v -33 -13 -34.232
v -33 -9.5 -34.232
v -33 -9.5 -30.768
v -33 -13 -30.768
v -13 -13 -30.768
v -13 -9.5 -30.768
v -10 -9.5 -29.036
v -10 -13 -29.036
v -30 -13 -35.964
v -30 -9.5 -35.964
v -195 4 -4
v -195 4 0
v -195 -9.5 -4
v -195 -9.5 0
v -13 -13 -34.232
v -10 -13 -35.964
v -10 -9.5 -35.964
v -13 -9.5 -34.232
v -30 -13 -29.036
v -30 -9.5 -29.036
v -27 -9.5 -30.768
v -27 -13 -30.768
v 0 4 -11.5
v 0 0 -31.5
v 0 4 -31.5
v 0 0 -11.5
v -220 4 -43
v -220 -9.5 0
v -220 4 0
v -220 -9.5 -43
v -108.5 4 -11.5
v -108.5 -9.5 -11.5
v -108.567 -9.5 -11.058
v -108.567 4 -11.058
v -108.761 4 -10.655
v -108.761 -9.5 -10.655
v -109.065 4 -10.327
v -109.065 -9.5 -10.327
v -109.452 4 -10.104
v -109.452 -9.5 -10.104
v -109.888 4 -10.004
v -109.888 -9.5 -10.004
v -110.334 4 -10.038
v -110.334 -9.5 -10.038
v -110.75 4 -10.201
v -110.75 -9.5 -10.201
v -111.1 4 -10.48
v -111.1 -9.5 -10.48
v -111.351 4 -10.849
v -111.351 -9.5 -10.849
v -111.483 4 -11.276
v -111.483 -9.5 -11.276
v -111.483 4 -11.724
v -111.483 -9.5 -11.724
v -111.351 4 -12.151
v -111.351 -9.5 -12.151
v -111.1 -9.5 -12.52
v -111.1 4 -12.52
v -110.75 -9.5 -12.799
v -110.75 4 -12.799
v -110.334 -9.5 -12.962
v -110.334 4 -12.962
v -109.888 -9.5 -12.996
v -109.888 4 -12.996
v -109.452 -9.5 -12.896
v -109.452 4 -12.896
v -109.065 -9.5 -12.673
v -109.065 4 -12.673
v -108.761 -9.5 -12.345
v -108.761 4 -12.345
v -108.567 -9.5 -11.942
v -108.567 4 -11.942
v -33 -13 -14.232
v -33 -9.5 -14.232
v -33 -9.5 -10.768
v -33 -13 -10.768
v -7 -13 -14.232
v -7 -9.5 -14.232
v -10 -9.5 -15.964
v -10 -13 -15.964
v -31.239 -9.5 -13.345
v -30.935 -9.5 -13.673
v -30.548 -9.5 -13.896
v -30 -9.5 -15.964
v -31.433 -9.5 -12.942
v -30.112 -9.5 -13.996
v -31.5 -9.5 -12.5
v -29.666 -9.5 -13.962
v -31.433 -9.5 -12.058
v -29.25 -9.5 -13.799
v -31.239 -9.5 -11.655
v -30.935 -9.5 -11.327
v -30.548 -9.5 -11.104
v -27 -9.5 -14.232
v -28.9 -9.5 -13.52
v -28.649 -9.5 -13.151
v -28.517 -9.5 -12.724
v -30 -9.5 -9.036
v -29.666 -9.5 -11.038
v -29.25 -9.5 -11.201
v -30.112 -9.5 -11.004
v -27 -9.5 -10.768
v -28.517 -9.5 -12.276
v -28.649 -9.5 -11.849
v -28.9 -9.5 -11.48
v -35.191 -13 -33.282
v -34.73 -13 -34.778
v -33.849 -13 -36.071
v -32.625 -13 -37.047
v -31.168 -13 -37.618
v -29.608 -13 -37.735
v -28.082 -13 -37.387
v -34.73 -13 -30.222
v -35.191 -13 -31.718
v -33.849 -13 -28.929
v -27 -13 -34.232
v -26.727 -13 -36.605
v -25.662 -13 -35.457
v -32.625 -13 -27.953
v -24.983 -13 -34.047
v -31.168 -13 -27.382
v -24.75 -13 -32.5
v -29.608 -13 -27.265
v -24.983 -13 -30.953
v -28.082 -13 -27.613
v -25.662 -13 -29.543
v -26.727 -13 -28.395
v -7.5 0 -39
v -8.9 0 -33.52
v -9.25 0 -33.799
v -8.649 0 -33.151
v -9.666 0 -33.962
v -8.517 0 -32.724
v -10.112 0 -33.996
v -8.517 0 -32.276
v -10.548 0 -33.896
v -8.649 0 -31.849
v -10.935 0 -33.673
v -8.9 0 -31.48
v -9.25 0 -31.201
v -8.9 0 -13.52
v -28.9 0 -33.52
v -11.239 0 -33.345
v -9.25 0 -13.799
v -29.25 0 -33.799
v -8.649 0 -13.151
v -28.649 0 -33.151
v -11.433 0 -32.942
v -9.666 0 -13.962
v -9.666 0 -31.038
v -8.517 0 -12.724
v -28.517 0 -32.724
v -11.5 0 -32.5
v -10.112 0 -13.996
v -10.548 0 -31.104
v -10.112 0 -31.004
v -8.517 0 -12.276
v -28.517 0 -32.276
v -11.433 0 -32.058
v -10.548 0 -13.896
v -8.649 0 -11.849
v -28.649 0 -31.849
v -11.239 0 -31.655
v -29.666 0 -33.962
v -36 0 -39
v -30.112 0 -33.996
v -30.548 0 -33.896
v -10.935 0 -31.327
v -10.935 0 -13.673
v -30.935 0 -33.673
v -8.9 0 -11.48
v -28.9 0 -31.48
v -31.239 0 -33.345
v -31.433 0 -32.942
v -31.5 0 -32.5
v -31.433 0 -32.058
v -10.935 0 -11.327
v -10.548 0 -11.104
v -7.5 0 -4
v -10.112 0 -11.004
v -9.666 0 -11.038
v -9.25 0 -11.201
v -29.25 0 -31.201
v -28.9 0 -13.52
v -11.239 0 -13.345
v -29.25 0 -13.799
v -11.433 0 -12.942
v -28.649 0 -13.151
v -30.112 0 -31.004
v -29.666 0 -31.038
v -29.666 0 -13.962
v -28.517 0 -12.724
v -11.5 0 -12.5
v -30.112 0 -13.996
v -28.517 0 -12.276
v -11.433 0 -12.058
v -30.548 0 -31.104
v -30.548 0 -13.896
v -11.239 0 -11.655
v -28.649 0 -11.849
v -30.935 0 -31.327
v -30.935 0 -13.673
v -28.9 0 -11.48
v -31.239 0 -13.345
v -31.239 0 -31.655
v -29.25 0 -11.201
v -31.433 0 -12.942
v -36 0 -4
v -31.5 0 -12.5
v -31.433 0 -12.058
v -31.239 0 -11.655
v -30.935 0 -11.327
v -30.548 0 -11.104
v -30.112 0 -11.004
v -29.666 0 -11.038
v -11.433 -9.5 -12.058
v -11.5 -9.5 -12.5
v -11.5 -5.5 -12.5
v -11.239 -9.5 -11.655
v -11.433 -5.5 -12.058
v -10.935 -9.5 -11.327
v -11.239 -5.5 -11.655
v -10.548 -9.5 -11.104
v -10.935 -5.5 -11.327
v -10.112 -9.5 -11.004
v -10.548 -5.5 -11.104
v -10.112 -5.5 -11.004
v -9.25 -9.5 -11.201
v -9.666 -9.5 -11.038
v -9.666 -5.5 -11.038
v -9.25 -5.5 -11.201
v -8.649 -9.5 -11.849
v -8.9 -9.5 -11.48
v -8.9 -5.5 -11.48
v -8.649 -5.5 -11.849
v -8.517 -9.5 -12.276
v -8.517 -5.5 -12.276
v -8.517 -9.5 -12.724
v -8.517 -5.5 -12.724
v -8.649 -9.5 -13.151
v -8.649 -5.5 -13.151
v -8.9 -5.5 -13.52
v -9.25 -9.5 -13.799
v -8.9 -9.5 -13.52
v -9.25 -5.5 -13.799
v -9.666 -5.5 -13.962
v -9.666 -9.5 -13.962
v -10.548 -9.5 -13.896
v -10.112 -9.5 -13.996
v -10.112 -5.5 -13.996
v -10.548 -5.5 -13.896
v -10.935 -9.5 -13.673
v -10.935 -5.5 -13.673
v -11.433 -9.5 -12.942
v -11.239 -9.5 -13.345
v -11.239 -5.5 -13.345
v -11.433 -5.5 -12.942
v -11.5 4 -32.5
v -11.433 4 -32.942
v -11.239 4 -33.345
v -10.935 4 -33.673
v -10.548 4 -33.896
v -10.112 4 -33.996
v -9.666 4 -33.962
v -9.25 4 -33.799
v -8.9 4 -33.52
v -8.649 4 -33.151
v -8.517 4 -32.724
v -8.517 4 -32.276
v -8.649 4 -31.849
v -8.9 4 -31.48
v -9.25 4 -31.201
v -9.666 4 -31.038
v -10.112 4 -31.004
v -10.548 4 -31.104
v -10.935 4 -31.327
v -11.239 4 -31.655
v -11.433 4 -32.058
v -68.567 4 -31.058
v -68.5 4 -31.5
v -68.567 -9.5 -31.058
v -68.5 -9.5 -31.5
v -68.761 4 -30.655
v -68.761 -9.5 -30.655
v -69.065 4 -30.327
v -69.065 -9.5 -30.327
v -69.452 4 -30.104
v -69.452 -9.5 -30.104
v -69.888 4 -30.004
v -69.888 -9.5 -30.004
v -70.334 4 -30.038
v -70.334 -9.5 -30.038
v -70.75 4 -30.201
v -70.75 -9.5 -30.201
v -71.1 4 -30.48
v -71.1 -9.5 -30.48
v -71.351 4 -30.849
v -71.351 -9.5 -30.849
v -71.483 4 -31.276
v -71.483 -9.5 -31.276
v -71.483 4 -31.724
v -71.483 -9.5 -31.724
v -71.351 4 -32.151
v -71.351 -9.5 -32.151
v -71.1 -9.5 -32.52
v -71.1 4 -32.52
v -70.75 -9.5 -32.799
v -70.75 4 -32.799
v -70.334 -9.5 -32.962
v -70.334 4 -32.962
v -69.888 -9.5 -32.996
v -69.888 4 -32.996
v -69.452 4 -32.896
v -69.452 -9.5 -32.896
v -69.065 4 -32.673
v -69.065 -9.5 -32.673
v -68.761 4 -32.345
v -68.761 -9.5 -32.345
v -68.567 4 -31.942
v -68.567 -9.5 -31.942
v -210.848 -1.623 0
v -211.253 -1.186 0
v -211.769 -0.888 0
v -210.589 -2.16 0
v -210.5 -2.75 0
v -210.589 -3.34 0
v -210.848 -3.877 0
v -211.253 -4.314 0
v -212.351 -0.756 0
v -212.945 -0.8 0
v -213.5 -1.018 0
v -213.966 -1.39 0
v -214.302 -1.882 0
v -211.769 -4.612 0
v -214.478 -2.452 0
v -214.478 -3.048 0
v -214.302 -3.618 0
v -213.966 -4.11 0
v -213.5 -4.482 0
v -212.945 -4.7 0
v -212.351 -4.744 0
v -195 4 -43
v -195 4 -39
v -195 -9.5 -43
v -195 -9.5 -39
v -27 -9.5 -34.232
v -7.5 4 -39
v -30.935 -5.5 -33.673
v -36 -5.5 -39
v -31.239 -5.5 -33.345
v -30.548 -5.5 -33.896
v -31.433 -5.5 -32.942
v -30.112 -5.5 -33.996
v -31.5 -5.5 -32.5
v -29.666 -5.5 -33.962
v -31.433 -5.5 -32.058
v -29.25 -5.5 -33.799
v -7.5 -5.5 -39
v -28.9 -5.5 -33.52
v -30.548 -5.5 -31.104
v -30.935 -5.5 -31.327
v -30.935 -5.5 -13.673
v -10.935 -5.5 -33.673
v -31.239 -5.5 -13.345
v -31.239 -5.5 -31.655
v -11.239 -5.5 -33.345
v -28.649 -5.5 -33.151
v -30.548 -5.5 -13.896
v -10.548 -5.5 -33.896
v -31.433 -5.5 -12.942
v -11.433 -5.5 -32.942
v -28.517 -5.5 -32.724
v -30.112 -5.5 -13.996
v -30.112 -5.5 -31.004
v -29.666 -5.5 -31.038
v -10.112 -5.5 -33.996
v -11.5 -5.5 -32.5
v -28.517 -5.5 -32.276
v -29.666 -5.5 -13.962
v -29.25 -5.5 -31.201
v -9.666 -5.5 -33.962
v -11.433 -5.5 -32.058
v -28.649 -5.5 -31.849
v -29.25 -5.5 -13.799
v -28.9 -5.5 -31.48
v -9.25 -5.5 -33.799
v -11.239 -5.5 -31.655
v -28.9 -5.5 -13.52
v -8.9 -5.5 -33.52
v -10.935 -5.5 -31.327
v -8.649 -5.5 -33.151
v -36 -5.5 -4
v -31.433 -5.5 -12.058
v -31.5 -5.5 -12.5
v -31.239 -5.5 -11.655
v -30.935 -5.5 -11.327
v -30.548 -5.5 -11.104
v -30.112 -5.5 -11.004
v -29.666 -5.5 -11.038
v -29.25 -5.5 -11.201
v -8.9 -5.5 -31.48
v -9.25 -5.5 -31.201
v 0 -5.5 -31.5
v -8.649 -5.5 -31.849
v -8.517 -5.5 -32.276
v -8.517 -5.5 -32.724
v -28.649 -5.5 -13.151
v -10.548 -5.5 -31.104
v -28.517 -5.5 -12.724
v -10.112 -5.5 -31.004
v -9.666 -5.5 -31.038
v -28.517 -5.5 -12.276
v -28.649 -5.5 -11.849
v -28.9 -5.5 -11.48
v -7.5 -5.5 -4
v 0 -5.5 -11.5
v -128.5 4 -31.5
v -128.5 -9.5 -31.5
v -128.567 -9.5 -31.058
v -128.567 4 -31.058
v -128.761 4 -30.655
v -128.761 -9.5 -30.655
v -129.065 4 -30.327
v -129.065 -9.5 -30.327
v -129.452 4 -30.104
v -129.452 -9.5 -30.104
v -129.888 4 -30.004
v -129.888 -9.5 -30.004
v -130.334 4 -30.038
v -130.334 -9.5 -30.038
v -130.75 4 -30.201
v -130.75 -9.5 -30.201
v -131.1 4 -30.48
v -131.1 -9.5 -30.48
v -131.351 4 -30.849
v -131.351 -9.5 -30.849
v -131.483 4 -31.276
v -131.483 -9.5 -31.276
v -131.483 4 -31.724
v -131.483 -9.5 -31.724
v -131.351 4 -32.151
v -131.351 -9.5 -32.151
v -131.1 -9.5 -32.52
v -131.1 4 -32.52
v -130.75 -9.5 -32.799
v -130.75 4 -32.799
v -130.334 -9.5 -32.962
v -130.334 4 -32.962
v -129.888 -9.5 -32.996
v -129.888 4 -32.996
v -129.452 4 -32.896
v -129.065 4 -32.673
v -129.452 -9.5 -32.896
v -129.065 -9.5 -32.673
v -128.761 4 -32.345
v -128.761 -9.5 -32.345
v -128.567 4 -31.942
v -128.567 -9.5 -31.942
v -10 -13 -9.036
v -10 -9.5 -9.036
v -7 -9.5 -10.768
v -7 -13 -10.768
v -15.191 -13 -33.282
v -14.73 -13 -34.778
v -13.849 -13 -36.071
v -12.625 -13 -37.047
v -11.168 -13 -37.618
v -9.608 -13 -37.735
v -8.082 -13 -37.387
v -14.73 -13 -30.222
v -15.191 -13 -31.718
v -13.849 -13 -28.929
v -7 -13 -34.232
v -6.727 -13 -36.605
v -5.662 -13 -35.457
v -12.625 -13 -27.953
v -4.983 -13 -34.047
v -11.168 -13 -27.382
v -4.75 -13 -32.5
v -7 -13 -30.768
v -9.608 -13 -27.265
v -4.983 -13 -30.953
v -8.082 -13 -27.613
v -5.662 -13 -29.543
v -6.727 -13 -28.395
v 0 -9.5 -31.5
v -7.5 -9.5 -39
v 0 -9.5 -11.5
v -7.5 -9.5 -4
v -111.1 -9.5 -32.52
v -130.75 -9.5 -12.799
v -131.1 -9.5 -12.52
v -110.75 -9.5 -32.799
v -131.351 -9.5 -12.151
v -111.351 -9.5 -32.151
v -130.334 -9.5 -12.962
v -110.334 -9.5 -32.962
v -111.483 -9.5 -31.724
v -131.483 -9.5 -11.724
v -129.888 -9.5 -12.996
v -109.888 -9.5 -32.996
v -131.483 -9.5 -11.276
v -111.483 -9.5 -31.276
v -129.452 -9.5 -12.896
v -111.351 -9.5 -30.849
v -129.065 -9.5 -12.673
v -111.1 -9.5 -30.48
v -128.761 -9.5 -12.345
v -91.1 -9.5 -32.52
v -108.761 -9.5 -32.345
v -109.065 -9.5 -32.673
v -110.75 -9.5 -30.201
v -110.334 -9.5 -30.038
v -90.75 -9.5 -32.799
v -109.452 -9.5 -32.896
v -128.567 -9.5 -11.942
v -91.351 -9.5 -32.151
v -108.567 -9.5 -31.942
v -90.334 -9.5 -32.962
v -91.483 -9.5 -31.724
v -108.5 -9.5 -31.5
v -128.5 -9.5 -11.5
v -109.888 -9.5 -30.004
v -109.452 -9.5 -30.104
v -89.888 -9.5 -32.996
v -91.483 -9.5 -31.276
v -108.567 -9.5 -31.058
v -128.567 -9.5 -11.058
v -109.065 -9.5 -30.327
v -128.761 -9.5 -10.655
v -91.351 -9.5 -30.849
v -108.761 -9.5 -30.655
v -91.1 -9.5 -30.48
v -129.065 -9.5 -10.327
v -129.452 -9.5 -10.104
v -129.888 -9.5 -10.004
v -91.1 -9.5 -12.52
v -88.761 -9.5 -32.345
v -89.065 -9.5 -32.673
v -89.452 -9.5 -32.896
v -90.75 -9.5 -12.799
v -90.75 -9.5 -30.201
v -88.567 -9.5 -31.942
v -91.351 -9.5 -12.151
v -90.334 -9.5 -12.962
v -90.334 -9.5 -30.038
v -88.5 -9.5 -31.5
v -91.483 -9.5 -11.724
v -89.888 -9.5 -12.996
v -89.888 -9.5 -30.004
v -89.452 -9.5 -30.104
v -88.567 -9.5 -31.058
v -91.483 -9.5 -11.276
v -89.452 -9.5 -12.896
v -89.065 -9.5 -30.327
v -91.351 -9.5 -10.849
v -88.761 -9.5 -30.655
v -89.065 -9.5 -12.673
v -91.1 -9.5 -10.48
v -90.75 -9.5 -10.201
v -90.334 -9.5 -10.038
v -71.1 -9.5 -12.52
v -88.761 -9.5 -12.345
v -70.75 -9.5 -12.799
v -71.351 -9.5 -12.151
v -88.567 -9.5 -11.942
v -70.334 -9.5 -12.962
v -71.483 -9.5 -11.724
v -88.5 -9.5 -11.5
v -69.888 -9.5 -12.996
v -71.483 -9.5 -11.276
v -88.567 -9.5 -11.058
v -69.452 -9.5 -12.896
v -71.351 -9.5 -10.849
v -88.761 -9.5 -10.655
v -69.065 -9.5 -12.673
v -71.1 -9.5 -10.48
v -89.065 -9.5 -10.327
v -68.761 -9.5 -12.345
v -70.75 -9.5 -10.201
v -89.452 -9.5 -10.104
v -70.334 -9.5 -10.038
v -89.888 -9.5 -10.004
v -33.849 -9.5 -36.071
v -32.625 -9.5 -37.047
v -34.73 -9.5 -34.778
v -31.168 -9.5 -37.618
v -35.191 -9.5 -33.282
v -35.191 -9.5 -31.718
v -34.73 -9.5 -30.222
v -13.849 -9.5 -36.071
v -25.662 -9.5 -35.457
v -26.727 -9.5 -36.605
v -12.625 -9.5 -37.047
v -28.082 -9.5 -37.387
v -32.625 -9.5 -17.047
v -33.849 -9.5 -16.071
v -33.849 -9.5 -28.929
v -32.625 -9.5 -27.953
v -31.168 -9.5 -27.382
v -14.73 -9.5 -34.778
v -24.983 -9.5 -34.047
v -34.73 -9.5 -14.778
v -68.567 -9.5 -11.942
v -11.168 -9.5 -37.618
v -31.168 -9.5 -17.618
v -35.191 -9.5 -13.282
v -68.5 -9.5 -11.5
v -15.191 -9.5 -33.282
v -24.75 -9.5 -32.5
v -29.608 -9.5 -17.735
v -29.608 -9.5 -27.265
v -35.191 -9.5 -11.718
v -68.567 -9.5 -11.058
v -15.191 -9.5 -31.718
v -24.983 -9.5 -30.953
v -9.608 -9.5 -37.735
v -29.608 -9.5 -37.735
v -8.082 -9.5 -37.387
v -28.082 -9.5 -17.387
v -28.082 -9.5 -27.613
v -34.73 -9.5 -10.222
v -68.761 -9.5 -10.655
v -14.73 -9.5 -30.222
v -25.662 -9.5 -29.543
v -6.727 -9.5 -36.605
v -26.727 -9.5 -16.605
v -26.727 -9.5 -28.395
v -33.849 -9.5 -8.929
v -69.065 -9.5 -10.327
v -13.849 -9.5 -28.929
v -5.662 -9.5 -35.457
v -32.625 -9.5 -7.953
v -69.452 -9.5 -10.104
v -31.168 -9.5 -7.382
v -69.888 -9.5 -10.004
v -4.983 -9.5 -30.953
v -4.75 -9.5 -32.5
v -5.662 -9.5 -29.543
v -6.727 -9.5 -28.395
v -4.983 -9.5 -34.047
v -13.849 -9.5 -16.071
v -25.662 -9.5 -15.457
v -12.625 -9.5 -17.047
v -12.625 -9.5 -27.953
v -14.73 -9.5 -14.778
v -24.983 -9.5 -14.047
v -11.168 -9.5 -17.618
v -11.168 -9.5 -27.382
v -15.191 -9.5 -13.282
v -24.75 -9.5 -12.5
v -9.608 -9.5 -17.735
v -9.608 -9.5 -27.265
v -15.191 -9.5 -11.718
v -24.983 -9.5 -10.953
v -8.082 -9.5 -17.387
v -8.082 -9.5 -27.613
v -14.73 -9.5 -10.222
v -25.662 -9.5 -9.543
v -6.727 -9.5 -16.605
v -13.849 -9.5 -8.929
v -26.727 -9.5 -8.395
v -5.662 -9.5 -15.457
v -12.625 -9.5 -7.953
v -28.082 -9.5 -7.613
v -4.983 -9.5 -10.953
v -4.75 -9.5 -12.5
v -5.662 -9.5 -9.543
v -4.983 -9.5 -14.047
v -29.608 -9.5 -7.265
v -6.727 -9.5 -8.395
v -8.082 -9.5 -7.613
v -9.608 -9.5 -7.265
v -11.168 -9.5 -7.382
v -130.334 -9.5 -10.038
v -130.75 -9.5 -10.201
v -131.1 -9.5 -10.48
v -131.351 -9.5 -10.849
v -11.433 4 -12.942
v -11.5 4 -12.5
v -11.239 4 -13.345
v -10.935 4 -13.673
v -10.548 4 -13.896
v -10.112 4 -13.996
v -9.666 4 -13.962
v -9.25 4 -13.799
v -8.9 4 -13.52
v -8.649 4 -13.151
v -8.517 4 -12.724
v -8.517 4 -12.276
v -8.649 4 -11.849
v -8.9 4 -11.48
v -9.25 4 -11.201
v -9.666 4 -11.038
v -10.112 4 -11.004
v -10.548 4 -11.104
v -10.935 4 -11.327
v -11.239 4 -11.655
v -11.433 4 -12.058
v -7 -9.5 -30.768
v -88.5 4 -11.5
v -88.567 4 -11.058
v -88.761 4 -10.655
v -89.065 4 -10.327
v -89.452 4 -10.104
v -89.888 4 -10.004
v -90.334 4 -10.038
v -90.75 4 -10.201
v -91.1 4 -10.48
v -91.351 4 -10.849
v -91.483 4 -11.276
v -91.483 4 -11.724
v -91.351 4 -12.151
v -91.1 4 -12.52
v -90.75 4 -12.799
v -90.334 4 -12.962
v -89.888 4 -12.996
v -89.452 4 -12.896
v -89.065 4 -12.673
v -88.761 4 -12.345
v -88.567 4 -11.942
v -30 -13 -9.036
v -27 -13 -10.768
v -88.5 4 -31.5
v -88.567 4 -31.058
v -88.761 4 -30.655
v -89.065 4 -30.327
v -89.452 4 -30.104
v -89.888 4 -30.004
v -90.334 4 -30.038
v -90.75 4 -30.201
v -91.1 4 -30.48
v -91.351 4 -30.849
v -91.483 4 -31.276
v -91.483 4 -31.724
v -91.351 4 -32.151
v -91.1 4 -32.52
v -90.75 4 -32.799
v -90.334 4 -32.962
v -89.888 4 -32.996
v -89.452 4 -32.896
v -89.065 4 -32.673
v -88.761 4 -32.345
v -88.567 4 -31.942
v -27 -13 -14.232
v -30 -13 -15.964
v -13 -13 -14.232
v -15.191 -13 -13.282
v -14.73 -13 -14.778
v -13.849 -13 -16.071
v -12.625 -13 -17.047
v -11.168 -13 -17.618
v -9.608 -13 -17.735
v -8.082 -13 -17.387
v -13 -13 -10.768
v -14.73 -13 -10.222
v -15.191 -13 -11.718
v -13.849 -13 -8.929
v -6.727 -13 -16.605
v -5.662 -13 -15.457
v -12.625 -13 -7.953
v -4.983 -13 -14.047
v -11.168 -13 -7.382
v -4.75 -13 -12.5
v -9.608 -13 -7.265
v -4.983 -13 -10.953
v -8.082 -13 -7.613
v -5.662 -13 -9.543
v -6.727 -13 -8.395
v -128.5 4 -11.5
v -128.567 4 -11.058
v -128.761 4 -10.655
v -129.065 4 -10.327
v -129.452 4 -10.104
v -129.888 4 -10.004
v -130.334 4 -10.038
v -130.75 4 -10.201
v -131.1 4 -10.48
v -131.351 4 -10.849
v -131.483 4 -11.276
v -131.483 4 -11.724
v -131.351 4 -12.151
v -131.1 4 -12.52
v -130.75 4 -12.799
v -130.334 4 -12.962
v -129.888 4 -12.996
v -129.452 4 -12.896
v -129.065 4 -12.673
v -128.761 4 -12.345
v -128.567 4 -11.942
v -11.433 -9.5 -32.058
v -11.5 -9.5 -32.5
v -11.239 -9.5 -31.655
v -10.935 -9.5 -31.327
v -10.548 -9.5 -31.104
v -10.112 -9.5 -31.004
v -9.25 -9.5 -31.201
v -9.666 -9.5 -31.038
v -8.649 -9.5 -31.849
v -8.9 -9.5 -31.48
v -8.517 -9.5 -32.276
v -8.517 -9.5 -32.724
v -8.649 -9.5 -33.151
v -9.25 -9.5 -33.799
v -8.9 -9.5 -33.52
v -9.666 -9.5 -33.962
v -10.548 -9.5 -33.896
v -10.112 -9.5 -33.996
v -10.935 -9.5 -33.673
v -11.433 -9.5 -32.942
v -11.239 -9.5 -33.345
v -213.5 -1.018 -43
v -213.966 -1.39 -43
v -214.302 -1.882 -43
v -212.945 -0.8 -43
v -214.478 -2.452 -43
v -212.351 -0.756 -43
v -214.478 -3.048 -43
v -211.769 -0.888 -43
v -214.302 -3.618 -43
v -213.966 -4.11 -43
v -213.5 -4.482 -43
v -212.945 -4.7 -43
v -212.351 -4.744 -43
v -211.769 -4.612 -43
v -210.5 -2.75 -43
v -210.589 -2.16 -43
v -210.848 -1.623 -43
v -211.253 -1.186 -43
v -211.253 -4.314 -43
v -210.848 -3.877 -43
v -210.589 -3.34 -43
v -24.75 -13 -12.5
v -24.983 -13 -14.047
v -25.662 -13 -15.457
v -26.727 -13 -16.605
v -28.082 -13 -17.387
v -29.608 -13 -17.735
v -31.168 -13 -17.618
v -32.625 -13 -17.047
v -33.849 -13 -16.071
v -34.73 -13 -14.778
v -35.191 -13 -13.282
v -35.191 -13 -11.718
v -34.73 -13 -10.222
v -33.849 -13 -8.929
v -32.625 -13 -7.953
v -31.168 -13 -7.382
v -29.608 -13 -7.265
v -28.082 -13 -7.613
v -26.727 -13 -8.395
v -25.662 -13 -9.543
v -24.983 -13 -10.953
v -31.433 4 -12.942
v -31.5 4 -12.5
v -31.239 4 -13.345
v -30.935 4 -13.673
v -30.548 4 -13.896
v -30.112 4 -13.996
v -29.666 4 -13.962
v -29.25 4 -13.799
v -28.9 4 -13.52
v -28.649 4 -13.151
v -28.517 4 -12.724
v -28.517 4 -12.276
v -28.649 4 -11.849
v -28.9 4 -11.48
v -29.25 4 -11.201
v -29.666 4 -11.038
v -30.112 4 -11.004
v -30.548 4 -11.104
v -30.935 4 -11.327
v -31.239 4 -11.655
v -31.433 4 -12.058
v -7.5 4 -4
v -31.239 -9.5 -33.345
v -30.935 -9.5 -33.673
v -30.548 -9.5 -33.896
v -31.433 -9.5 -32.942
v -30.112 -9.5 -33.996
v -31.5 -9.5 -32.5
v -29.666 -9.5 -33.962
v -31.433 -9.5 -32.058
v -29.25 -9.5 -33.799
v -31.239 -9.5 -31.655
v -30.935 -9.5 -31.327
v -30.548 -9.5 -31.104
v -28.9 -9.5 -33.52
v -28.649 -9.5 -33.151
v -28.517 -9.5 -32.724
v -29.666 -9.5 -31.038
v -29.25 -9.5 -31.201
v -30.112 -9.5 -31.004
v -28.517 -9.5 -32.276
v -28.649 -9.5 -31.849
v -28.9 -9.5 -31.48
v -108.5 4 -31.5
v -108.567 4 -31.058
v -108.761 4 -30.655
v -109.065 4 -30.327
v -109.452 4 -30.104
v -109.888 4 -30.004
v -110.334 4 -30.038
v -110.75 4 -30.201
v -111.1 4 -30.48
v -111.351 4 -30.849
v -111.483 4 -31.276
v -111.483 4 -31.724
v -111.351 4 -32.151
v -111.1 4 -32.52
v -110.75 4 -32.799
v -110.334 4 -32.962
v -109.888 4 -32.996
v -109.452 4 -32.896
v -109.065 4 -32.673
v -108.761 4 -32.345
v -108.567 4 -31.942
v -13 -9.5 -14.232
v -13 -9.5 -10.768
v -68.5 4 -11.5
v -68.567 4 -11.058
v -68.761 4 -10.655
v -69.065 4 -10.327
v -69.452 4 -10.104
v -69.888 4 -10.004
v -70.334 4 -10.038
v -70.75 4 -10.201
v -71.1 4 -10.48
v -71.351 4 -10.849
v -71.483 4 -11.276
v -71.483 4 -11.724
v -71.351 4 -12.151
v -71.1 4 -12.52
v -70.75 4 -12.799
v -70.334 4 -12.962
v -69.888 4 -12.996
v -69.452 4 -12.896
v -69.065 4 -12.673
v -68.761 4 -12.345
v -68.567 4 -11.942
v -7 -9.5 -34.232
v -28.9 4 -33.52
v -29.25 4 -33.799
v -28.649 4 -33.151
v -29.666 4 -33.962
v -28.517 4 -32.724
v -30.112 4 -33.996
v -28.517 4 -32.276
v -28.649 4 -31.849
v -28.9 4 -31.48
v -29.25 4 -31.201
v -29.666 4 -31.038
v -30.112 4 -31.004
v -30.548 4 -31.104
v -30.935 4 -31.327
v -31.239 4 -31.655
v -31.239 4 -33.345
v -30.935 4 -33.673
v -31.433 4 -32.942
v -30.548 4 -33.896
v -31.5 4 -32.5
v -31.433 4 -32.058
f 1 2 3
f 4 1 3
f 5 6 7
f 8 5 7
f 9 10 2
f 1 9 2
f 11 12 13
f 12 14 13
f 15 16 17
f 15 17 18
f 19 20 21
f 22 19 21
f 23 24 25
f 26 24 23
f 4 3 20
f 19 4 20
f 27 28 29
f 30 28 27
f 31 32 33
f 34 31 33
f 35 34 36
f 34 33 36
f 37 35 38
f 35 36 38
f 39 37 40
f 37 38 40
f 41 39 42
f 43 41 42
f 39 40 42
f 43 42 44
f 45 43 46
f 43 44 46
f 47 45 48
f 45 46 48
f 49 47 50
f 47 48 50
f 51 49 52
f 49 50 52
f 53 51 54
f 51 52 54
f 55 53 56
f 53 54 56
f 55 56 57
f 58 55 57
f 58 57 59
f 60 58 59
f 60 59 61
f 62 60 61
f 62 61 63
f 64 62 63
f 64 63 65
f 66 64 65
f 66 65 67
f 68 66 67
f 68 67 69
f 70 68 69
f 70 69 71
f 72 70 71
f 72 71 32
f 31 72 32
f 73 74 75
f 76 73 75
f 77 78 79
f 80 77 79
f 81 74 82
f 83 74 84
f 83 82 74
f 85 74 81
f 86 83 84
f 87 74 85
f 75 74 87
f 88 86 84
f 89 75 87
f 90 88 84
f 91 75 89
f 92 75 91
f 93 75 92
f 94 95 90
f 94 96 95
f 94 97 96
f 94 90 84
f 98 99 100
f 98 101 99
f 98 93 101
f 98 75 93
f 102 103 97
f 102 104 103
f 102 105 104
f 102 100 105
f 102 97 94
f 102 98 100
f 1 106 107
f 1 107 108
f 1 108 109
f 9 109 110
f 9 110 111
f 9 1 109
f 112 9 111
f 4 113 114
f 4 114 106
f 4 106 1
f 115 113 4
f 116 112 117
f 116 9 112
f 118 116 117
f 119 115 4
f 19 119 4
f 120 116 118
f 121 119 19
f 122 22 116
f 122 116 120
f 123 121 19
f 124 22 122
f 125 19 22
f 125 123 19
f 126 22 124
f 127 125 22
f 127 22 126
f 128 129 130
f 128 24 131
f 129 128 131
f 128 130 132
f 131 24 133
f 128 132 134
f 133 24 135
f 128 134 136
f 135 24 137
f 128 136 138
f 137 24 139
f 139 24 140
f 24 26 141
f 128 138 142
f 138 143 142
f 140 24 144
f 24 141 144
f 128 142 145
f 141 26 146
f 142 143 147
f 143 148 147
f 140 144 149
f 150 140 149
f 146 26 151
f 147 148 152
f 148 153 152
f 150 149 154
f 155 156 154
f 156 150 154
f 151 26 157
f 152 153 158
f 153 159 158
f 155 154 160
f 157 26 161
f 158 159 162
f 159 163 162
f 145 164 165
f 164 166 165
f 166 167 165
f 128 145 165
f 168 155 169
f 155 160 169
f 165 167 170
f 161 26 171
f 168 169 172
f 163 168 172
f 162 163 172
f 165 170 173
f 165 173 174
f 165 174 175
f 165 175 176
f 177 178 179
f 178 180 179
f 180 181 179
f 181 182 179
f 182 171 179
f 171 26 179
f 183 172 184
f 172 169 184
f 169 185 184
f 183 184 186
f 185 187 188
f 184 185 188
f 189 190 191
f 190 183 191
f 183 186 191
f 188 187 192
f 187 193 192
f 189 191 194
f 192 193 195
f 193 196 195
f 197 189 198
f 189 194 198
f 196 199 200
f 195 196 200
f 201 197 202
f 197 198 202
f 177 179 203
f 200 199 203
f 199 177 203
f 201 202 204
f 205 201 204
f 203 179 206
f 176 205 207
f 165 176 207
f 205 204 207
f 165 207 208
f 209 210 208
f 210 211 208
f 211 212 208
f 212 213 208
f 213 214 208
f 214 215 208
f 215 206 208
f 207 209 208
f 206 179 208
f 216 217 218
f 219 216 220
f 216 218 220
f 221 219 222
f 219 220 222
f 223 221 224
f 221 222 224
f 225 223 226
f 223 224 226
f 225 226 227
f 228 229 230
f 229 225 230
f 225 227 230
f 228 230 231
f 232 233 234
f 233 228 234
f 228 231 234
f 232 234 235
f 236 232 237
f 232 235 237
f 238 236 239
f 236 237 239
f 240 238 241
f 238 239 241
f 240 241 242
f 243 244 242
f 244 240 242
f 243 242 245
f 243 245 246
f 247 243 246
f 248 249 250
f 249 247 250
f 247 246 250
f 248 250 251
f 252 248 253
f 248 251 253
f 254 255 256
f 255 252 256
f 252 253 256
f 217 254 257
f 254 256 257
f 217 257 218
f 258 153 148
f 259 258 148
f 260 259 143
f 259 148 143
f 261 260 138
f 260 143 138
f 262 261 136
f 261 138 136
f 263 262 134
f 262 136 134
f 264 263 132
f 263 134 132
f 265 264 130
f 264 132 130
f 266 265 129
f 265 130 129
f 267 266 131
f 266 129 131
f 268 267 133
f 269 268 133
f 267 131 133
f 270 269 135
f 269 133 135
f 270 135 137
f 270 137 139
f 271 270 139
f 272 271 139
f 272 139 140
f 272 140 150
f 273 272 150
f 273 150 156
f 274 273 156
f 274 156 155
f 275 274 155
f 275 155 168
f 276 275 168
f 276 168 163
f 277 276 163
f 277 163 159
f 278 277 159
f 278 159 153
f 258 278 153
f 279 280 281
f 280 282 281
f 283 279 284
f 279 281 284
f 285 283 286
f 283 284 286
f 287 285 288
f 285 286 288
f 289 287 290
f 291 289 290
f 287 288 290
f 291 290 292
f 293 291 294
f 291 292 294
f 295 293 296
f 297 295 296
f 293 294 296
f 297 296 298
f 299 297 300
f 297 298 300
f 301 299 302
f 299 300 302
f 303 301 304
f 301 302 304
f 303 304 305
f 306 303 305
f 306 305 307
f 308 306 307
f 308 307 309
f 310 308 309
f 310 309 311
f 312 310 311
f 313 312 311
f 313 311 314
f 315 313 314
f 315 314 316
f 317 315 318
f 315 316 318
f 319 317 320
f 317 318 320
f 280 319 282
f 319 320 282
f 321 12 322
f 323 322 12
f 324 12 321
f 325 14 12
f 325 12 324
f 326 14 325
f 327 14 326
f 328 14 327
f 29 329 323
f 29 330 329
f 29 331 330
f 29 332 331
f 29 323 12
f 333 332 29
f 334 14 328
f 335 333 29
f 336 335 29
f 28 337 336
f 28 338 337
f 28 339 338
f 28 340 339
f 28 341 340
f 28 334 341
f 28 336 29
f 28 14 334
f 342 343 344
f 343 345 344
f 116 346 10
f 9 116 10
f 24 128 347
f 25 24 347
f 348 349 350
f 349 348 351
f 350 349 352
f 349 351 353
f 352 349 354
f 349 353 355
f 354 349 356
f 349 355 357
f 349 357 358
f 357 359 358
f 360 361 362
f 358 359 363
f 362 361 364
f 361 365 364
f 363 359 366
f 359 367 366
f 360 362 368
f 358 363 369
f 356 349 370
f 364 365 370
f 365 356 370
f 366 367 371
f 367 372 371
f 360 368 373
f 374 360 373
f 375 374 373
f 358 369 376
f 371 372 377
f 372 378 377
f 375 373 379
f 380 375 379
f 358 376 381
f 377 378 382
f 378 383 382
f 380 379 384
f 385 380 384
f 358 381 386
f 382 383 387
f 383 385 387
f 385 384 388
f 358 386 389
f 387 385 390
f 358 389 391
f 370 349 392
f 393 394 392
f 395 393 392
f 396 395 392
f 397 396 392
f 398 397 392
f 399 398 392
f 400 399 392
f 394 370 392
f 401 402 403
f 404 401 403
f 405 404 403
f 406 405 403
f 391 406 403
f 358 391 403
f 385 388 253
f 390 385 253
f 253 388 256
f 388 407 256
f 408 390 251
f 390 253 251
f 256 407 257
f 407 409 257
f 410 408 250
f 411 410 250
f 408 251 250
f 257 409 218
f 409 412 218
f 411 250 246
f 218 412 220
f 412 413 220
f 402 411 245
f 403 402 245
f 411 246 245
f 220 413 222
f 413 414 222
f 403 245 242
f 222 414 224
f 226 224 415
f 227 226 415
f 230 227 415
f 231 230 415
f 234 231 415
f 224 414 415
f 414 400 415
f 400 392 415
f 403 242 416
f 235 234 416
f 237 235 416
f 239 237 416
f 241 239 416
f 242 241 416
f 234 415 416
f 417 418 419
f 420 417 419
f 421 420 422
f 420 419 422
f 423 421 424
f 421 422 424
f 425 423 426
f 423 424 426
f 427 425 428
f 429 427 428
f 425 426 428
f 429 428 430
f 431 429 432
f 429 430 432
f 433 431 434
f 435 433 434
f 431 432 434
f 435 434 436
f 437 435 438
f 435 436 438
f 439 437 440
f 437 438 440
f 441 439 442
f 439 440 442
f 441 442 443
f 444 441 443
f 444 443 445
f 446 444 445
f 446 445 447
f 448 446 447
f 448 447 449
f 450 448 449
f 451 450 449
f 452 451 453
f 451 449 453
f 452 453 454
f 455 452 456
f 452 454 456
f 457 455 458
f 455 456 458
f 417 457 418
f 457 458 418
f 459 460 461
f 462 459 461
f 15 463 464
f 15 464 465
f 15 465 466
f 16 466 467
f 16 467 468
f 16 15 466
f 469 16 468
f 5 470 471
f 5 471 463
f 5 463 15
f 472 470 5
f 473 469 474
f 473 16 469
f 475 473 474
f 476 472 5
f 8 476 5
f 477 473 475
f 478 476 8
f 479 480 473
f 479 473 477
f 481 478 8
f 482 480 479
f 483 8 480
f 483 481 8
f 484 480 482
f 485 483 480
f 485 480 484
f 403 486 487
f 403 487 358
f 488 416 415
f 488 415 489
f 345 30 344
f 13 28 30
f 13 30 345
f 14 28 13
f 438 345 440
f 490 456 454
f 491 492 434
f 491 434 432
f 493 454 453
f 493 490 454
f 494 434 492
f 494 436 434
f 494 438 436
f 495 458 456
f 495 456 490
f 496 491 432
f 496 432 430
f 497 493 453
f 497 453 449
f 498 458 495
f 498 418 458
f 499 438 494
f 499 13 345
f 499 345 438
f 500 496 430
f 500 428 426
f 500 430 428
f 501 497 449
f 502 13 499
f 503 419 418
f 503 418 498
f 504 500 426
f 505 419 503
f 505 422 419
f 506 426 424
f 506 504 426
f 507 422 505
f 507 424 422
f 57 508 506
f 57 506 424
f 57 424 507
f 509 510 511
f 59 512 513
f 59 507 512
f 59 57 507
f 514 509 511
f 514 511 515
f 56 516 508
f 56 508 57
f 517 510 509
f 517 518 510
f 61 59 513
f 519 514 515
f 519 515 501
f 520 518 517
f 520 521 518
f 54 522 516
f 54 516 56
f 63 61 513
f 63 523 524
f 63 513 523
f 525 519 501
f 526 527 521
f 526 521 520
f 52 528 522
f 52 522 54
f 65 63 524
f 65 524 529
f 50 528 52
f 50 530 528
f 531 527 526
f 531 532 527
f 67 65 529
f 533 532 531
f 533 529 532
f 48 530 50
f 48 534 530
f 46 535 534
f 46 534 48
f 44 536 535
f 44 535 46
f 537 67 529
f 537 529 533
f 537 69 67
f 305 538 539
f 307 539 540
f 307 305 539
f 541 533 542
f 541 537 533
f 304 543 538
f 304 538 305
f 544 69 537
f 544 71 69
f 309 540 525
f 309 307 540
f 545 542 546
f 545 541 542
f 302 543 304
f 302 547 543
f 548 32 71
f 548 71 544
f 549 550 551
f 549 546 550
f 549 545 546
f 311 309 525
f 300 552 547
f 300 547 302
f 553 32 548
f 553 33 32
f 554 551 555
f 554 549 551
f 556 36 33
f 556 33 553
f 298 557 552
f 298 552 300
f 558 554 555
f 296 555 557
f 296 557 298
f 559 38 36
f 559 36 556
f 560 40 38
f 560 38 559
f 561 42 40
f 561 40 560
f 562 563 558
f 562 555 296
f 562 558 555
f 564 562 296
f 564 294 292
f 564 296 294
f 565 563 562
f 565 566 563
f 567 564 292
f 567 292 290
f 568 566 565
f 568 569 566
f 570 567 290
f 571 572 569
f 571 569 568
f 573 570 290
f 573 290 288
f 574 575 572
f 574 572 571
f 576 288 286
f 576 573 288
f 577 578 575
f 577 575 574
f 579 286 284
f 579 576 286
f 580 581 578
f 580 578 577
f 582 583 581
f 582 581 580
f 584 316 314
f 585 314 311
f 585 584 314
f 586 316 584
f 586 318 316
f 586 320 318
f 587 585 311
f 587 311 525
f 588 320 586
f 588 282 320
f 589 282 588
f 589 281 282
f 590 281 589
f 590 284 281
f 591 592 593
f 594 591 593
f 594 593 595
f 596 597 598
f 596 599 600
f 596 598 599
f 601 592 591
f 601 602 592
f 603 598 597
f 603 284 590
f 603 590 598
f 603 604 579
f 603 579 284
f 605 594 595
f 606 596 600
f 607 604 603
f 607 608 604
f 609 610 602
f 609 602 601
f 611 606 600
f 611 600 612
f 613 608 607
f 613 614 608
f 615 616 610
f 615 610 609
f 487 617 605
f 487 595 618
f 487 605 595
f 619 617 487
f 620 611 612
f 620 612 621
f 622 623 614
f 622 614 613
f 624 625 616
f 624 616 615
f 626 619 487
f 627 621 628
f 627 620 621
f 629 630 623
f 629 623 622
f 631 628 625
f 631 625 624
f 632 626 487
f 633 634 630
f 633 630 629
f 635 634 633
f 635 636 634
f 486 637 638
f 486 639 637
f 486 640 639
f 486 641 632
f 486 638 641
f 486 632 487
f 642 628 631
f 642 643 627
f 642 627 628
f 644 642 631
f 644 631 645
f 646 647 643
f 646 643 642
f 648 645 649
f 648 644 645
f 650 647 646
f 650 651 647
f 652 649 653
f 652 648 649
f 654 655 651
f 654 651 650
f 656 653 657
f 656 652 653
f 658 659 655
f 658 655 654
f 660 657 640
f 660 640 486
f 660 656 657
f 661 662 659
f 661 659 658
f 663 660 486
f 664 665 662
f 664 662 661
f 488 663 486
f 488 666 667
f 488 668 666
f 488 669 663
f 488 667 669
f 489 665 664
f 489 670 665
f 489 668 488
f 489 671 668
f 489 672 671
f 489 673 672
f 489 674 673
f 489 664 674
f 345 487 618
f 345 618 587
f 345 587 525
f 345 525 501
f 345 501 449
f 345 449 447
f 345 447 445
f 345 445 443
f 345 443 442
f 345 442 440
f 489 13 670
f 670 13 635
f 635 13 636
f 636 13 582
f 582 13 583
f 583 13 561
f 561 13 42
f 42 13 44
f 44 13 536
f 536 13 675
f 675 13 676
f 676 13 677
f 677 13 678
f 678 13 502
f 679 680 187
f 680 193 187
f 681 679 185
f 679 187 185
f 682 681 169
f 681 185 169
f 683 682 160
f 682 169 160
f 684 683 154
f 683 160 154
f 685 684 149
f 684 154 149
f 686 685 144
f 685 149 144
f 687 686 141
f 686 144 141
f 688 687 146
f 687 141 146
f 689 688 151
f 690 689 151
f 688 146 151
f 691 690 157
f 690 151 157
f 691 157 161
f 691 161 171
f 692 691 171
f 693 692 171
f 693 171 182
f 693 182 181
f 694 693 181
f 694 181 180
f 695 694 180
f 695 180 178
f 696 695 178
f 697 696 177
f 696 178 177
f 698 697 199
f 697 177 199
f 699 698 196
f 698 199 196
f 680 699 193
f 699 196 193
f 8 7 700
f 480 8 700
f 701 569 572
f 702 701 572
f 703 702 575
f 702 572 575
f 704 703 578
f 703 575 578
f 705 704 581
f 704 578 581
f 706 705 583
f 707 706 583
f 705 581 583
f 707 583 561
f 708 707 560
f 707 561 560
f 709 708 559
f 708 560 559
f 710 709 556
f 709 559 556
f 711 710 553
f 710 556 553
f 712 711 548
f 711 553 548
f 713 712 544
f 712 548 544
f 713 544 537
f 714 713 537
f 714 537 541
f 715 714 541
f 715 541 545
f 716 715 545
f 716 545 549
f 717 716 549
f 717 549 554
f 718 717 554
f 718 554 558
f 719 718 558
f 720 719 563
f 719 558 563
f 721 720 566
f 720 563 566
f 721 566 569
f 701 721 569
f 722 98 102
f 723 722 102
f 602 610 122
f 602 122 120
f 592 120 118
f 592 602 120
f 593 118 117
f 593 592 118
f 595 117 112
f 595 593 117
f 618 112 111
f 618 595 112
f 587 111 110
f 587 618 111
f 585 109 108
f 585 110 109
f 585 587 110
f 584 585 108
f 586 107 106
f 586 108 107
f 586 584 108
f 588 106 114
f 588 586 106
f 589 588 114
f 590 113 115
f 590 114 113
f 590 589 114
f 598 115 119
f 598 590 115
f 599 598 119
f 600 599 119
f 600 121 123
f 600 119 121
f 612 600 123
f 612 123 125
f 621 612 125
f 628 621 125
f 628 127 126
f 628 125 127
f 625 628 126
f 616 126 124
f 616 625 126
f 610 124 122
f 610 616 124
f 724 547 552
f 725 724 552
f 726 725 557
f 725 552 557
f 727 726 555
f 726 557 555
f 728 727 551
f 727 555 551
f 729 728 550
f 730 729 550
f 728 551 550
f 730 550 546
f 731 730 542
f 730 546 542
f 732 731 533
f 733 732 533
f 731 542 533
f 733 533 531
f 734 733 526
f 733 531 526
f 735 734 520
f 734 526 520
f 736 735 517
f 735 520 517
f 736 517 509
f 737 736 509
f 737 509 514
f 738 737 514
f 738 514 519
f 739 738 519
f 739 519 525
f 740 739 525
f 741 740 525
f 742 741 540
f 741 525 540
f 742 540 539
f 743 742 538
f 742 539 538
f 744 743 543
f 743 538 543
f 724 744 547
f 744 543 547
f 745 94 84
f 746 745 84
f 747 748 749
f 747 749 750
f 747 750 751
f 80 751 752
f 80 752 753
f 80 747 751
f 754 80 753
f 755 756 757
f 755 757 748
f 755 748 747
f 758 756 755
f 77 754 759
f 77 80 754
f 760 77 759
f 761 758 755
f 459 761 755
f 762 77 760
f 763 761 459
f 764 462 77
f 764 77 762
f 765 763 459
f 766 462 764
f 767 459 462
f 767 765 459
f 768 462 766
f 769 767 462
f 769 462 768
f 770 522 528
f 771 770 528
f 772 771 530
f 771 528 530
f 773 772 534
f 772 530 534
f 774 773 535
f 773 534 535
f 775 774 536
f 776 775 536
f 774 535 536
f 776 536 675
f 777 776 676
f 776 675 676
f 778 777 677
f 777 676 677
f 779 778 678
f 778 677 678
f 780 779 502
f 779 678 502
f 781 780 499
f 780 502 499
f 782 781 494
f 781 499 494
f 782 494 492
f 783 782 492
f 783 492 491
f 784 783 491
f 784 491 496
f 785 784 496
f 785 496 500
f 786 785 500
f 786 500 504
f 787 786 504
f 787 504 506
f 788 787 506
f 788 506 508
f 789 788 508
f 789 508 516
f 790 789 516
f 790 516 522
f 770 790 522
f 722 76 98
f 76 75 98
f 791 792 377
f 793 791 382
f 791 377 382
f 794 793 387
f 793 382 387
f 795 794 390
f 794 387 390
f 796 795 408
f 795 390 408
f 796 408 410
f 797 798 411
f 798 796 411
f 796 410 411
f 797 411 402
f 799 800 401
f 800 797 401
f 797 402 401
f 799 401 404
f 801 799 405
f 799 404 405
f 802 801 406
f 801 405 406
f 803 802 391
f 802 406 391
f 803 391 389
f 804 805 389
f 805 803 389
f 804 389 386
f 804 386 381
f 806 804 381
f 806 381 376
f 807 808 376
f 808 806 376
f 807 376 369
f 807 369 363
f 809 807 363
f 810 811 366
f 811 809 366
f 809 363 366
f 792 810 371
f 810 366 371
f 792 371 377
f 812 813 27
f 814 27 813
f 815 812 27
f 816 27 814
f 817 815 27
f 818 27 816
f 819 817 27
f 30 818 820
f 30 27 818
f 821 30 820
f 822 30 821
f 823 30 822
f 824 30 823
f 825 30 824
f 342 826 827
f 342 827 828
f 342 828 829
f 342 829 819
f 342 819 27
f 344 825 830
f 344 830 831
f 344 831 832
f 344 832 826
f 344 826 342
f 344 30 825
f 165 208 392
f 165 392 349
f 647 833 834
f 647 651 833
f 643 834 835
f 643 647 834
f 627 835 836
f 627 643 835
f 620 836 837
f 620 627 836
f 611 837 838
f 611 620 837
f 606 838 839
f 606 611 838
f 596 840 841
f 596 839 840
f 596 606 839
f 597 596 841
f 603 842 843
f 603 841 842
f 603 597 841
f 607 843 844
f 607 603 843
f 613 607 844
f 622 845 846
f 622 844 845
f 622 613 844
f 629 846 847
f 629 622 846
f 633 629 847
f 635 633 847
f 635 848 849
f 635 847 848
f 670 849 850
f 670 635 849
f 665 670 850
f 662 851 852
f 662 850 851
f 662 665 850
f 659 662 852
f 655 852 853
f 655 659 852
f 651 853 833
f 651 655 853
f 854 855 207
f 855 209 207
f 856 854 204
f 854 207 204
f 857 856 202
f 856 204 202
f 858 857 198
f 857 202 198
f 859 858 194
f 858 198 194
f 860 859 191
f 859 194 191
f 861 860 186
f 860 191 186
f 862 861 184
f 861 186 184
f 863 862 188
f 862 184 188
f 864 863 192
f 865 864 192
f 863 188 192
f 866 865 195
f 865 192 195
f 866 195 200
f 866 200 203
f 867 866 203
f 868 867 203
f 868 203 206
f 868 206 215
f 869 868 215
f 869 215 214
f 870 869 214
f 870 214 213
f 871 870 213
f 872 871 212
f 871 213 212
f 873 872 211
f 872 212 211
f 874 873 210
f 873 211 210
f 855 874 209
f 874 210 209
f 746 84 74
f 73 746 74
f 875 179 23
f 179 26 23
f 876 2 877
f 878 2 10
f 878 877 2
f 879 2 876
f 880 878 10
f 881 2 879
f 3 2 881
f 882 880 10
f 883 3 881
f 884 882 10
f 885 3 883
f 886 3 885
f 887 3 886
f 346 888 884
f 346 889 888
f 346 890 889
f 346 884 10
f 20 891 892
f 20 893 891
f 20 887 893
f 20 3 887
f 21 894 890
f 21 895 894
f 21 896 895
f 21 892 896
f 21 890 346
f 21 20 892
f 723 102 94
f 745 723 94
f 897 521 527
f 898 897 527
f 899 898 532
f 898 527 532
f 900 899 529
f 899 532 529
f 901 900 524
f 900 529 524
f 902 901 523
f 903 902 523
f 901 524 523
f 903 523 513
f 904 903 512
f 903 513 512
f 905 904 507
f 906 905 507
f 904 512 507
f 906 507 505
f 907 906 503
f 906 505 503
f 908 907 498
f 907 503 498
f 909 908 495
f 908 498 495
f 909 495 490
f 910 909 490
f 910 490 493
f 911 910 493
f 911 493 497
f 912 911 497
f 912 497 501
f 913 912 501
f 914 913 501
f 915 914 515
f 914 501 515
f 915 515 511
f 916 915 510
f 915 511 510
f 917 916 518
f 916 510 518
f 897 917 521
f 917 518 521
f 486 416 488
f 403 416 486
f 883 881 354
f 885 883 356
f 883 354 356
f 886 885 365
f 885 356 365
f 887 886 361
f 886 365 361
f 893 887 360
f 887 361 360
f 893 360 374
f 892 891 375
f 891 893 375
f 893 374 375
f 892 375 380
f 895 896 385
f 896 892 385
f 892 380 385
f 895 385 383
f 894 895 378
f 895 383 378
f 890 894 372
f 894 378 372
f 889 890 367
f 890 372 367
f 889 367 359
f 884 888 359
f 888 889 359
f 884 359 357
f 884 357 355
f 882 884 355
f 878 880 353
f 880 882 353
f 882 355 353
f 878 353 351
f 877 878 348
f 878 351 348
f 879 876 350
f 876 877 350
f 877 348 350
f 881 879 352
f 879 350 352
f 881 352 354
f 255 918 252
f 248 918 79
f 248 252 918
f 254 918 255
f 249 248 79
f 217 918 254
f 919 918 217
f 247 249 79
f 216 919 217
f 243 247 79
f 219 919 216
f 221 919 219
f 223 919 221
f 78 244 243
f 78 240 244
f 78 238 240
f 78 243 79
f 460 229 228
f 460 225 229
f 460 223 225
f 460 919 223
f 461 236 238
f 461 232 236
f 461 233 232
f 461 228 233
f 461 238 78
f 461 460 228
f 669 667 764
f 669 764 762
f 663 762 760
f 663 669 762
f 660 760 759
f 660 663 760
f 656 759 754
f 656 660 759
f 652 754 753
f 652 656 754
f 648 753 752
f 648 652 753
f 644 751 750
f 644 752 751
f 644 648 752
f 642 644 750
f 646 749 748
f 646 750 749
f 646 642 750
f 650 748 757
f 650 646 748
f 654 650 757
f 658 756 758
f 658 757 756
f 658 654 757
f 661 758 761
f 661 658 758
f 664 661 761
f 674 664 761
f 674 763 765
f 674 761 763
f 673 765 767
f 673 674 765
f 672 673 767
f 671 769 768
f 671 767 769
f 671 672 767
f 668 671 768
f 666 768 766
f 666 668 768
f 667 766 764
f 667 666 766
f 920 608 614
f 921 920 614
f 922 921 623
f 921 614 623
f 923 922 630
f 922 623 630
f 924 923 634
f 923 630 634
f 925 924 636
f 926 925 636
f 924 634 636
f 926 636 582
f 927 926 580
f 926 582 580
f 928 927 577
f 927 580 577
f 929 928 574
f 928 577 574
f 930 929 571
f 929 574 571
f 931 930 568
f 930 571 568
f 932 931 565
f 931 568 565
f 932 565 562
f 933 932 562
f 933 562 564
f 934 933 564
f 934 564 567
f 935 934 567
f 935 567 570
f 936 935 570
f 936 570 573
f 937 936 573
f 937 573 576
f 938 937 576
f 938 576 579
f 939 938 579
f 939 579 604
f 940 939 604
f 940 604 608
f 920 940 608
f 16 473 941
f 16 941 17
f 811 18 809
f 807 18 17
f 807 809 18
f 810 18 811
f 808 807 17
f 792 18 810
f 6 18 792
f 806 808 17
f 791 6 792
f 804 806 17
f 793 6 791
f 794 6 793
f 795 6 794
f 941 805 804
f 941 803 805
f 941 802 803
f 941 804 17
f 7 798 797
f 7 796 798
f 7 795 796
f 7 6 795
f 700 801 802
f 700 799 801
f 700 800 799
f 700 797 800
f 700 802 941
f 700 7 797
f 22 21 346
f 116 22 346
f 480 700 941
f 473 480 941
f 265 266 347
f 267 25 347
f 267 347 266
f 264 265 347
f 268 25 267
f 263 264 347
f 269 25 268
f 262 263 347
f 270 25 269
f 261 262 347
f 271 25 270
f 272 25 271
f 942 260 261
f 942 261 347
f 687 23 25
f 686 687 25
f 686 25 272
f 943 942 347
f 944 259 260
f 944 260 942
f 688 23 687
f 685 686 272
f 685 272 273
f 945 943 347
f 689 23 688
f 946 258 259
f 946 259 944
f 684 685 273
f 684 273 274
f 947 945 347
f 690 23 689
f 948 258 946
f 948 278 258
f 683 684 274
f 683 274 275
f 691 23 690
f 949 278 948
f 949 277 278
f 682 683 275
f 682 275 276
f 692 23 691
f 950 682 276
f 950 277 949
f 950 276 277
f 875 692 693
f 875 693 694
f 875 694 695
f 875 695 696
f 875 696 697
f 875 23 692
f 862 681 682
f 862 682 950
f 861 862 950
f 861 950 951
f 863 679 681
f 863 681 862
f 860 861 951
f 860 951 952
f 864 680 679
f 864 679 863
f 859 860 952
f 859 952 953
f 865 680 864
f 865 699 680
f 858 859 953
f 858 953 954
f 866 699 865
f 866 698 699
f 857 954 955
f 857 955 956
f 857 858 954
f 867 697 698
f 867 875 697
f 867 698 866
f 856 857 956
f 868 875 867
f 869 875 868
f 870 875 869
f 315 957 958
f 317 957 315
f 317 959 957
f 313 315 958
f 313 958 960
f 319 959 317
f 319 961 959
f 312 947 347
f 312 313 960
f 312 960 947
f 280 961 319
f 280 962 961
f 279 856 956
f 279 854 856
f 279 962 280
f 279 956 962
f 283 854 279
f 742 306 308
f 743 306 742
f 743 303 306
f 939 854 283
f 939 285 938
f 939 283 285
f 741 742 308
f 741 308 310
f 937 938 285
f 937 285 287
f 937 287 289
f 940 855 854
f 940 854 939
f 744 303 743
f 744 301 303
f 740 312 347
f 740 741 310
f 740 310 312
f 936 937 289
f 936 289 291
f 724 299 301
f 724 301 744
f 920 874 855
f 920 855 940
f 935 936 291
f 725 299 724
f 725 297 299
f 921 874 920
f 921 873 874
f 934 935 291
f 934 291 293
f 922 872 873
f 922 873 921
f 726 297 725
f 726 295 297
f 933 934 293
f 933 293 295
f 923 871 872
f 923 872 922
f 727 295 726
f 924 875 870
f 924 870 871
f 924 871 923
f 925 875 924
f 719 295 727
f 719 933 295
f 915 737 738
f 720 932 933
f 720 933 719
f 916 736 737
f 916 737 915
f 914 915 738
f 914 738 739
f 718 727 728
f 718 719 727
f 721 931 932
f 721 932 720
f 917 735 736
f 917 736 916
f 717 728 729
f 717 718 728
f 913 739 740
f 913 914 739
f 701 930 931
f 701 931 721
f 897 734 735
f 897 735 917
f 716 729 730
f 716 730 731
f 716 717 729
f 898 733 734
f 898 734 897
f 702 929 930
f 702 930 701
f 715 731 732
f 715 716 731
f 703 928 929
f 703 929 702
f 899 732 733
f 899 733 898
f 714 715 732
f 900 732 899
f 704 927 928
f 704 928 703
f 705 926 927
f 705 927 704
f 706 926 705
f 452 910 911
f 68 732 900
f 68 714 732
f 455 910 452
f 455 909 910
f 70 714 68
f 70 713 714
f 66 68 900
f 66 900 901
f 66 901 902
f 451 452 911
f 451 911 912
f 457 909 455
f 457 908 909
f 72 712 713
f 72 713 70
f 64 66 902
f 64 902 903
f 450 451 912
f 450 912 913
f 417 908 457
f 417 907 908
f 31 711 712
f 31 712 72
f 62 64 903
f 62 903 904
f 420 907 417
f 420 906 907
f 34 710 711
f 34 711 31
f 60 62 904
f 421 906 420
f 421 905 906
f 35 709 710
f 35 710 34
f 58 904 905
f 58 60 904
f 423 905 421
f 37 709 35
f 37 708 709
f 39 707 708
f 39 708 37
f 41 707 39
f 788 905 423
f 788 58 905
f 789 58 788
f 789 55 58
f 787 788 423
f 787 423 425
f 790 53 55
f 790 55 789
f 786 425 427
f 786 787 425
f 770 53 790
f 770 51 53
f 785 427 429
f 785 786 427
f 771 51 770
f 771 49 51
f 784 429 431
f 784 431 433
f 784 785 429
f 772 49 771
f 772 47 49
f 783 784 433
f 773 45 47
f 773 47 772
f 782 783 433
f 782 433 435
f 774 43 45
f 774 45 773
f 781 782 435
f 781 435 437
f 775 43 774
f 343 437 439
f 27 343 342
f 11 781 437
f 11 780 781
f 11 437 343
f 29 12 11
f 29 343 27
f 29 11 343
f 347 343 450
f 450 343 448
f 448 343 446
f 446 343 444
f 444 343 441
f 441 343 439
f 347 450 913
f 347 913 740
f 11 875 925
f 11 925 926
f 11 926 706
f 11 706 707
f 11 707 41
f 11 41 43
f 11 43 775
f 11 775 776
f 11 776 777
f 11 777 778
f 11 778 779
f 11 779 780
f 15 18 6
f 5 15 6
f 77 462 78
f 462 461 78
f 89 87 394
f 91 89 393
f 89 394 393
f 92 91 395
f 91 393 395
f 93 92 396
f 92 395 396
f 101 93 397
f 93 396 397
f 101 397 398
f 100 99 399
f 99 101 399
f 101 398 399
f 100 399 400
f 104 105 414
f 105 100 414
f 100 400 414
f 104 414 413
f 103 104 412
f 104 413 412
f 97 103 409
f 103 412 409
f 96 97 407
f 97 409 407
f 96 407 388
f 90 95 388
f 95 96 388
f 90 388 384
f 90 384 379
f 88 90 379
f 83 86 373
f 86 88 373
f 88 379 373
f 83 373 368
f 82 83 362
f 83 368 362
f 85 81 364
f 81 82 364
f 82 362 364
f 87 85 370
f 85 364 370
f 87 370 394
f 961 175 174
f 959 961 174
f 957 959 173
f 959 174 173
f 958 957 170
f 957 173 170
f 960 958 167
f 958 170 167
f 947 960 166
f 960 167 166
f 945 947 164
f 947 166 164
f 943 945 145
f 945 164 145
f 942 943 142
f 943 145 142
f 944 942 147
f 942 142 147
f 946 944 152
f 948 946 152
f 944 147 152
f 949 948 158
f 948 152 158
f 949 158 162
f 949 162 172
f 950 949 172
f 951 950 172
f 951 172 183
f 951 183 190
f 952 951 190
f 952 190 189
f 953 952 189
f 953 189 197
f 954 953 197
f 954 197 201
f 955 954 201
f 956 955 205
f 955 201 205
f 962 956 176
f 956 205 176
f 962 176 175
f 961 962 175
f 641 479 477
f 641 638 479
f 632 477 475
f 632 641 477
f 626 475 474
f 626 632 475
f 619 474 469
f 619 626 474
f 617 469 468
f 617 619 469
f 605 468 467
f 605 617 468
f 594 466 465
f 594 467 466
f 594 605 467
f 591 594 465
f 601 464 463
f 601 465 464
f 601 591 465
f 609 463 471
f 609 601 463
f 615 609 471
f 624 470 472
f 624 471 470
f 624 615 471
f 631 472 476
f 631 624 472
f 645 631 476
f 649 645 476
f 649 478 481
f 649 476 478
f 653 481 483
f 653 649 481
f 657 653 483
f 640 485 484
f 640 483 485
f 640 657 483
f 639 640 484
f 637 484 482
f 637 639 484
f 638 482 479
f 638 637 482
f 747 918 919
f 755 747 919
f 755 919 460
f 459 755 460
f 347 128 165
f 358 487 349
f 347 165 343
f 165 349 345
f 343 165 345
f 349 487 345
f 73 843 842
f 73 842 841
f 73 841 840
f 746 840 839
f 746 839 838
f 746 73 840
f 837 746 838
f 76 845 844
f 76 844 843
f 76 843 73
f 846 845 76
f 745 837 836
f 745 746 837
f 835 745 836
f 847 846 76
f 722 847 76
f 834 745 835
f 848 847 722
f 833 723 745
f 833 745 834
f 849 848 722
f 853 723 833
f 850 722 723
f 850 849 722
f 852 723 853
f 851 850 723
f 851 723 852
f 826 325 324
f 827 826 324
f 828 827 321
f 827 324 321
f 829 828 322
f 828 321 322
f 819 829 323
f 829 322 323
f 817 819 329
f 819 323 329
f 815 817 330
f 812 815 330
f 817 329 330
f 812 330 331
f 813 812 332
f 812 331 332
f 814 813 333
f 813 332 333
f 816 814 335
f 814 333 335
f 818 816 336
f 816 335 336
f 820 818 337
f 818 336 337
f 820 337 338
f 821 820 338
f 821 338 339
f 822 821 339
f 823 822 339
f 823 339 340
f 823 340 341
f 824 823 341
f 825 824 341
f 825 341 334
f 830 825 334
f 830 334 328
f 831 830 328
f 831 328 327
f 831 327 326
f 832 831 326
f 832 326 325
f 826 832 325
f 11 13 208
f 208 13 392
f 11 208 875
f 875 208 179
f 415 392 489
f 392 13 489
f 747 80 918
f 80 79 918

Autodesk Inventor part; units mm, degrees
sketch "Sketch1" plane through (0, 0, 0) normal (0, 1, 0) x (-1, 0, 0)
  line L0 (0, 0) -> (220, 0)
  line L1 (220, 0) -> (220, -43)
  line L2 (220, -43) -> (0, -43)
  line L3 (0, -43) -> (0, 0)
  line L4 (10, -12.5) -> (30, -12.5)
  line L5 (30, -12.5) -> (30, -32.5)
  line L6 (30, -32.5) -> (10, -32.5)
  line L7 (10, -32.5) -> (10, -12.5)
  circle A0 centre (10, -12.5) radius 1.5
  circle A1 centre (30, -32.5) radius 1.5
  circle A2 centre (30, -12.5) radius 1.5
  circle A3 centre (10, -32.5) radius 1.5
  line L8 (220, 0) -> (195, 0)
  line L9 (195, 0) -> (195, -43)
  line L10 (195, -43) -> (220, -43)
  line L11 (220, -43) -> (220, 0)
  line L12 (195, -4) -> (0, -4)
  line L13 (0, -4) -> (0, -39)
  line L14 (0, -39) -> (195, -39)
  line L15 (195, -39) -> (195, -4)
  line L16 (36, -4) -> (36, -39)
  point P0 (195, 0)
  point P1 (0, -4)
  dimension "d0" = 220
  dimension "d1" = 43
  dimension "d2" = 20
  dimension "d3" = 20
  dimension "d4" = 12.5
  dimension "d5" = 10
  dimension "d6" = 3
  dimension "d7" = 3
  dimension "d8" = 3
  dimension "d9" = 3
  dimension "d18" = 4
  dimension "d19" = 4
  dimension "d23" = 36
  dimension "d66" = 25
extrude "Extrusion1" add sketch "Sketch1" along normal blind 4 contours L0 L1 L2 L9 | L12 L16 L14 L3 | L9 L14 L16 L12 | L4 A2 L5 A1 L6 A3 L7 A0
extrude "Extrusion2" add sketch "Sketch1" against normal blind 5.5 contours L0 L1 L2 L9 | L9 L14 L16 L12
ref_plane "Work Plane1" through (0, -2.75, 0) normal (0, -1, 0) x (1, 0, 0)
mirror "Mirror1" about plane through (0, -2.75, 0) normal (0, -1, 0) of "Extrusion1"
chamfer "Chamfer1" distance 7.5 angle 45 4 edges at (0, 2, -4) (0, -7.5, -4) (0, -7.5, -39) (0, 2, -39)
ref_plane "Work Plane2" through (-152.5, -8.5, -20) normal (0, 0, -1) x (-1, 0, 0)
sketch "Sketch5" plane through (-195, -9.5, -39) normal (0, -1, 0) x (1, 0, 0)
  circle A0 centre (165, 26.5) radius 1.5 projected
  line L0 (165, 29.9641) -> (168, 28.2321)
  line L1 (168, 28.2321) -> (168, 24.7679)
  line L2 (168, 24.7679) -> (165, 23.0359)
  line L3 (165, 23.0359) -> (162, 24.7679)
  line L4 (162, 24.7679) -> (162, 28.2321)
  line L5 (162, 28.2321) -> (165, 29.9641)
  circle A1 centre (185, 26.5) radius 1.5 projected
  line L6 (185, 29.9641) -> (188, 28.2321)
  line L7 (188, 28.2321) -> (188, 24.7679)
  line L8 (188, 24.7679) -> (185, 23.0359)
  line L9 (185, 23.0359) -> (182, 24.7679)
  line L10 (182, 24.7679) -> (182, 28.2321)
  line L11 (182, 28.2321) -> (185, 29.9641)
  circle A2 centre (185, 6.5) radius 1.5 projected
  line L12 (185, 9.9641) -> (188, 8.2321)
  line L13 (188, 8.2321) -> (188, 4.7679)
  line L14 (188, 4.7679) -> (185, 3.0359)
  line L15 (185, 3.0359) -> (182, 4.7679)
  line L16 (182, 4.7679) -> (182, 8.2321)
  line L17 (182, 8.2321) -> (185, 9.9641)
  circle A3 centre (165, 6.5) radius 1.5 projected
  line L18 (165, 9.9641) -> (168, 8.2321)
  line L19 (168, 8.2321) -> (168, 4.7679)
  line L20 (168, 4.7679) -> (165, 3.0359)
  line L21 (165, 3.0359) -> (162, 4.7679)
  line L22 (162, 4.7679) -> (162, 8.2321)
  line L23 (162, 8.2321) -> (165, 9.9641)
  circle A4 centre (165, 26.5) radius 5.25
  circle A5 centre (185, 26.5) radius 5.25
  circle A6 centre (185, 6.5) radius 5.25
  circle A7 centre (165, 6.5) radius 5.25
  point P0 (195, 39)
  dimension "d44" = 6
  dimension "d45" = 6
  dimension "d46" = 6
  dimension "d47" = 6
  dimension "d48" = 10.5
  dimension "d49" = 10.5
  dimension "d50" = 10.5
  dimension "d51" = 10.5
extrude "Extrusion5" add sketch "Sketch5" along normal blind 3.5 contours A4 | A5 | A6 | A7
sketch "Sketch6" plane through (-195, -9.5, -39) normal (0, -1, 0) x (1, 0, 0)
  circle A0 centre (65, 7.5) radius 1.5
  line L0 (187.5, 0) -> (0, 0) projected
  line L1 (0, 0) -> (0, -4) projected
  circle A1 centre (85, 7.5) radius 1.5
  circle A2 centre (105, 7.5) radius 1.5
  circle A3 centre (125, 7.5) radius 1.5
  point P0 (195, 39)
  point P1 (0, -5)
  dimension "d54" = 3
  dimension "d55" = 7.5
  dimension "d56" = 65
  dimension "d59" = 20
extrude "Extrusion6" cut sketch "Sketch6" against normal blind 33.25
ref_plane "Work Plane3" through (-195, -9.5, -21.5) normal (0, 0, -1) x (-1, 0, 0)
mirror "Mirror2" about plane through (-195, -9.5, -21.5) normal (0, 0, -1) of "Extrusion6"
sketch "Sketch7" plane through (-220, 4, 0) normal (0, 0, 1) x (1, 0, 0)
  point P0 (220, -4)
ref_plane "Work Plane4" through (-195, -9.5, -21.5) normal (0, 0, 1) x (1, 0, 0)
sketch "Sketch9" plane through (-220, 4, 0) normal (0, 0, 1) x (1, 0, 0)
  circle A0 centre (7.5, -6.75) radius 2
  line L0 (0, -13.5) -> (0, 0) projected
  line L1 (0, 0) -> (25, 0) projected
  point P0 (220, -4)
  dimension "d75" = 4
  dimension "d76" = 7.5
  dimension "d77" = 6.75
extrude "Extrusion8" cut sketch "Sketch9" against normal blind 73.25
properties part number "RobotBaseMotorExt"
